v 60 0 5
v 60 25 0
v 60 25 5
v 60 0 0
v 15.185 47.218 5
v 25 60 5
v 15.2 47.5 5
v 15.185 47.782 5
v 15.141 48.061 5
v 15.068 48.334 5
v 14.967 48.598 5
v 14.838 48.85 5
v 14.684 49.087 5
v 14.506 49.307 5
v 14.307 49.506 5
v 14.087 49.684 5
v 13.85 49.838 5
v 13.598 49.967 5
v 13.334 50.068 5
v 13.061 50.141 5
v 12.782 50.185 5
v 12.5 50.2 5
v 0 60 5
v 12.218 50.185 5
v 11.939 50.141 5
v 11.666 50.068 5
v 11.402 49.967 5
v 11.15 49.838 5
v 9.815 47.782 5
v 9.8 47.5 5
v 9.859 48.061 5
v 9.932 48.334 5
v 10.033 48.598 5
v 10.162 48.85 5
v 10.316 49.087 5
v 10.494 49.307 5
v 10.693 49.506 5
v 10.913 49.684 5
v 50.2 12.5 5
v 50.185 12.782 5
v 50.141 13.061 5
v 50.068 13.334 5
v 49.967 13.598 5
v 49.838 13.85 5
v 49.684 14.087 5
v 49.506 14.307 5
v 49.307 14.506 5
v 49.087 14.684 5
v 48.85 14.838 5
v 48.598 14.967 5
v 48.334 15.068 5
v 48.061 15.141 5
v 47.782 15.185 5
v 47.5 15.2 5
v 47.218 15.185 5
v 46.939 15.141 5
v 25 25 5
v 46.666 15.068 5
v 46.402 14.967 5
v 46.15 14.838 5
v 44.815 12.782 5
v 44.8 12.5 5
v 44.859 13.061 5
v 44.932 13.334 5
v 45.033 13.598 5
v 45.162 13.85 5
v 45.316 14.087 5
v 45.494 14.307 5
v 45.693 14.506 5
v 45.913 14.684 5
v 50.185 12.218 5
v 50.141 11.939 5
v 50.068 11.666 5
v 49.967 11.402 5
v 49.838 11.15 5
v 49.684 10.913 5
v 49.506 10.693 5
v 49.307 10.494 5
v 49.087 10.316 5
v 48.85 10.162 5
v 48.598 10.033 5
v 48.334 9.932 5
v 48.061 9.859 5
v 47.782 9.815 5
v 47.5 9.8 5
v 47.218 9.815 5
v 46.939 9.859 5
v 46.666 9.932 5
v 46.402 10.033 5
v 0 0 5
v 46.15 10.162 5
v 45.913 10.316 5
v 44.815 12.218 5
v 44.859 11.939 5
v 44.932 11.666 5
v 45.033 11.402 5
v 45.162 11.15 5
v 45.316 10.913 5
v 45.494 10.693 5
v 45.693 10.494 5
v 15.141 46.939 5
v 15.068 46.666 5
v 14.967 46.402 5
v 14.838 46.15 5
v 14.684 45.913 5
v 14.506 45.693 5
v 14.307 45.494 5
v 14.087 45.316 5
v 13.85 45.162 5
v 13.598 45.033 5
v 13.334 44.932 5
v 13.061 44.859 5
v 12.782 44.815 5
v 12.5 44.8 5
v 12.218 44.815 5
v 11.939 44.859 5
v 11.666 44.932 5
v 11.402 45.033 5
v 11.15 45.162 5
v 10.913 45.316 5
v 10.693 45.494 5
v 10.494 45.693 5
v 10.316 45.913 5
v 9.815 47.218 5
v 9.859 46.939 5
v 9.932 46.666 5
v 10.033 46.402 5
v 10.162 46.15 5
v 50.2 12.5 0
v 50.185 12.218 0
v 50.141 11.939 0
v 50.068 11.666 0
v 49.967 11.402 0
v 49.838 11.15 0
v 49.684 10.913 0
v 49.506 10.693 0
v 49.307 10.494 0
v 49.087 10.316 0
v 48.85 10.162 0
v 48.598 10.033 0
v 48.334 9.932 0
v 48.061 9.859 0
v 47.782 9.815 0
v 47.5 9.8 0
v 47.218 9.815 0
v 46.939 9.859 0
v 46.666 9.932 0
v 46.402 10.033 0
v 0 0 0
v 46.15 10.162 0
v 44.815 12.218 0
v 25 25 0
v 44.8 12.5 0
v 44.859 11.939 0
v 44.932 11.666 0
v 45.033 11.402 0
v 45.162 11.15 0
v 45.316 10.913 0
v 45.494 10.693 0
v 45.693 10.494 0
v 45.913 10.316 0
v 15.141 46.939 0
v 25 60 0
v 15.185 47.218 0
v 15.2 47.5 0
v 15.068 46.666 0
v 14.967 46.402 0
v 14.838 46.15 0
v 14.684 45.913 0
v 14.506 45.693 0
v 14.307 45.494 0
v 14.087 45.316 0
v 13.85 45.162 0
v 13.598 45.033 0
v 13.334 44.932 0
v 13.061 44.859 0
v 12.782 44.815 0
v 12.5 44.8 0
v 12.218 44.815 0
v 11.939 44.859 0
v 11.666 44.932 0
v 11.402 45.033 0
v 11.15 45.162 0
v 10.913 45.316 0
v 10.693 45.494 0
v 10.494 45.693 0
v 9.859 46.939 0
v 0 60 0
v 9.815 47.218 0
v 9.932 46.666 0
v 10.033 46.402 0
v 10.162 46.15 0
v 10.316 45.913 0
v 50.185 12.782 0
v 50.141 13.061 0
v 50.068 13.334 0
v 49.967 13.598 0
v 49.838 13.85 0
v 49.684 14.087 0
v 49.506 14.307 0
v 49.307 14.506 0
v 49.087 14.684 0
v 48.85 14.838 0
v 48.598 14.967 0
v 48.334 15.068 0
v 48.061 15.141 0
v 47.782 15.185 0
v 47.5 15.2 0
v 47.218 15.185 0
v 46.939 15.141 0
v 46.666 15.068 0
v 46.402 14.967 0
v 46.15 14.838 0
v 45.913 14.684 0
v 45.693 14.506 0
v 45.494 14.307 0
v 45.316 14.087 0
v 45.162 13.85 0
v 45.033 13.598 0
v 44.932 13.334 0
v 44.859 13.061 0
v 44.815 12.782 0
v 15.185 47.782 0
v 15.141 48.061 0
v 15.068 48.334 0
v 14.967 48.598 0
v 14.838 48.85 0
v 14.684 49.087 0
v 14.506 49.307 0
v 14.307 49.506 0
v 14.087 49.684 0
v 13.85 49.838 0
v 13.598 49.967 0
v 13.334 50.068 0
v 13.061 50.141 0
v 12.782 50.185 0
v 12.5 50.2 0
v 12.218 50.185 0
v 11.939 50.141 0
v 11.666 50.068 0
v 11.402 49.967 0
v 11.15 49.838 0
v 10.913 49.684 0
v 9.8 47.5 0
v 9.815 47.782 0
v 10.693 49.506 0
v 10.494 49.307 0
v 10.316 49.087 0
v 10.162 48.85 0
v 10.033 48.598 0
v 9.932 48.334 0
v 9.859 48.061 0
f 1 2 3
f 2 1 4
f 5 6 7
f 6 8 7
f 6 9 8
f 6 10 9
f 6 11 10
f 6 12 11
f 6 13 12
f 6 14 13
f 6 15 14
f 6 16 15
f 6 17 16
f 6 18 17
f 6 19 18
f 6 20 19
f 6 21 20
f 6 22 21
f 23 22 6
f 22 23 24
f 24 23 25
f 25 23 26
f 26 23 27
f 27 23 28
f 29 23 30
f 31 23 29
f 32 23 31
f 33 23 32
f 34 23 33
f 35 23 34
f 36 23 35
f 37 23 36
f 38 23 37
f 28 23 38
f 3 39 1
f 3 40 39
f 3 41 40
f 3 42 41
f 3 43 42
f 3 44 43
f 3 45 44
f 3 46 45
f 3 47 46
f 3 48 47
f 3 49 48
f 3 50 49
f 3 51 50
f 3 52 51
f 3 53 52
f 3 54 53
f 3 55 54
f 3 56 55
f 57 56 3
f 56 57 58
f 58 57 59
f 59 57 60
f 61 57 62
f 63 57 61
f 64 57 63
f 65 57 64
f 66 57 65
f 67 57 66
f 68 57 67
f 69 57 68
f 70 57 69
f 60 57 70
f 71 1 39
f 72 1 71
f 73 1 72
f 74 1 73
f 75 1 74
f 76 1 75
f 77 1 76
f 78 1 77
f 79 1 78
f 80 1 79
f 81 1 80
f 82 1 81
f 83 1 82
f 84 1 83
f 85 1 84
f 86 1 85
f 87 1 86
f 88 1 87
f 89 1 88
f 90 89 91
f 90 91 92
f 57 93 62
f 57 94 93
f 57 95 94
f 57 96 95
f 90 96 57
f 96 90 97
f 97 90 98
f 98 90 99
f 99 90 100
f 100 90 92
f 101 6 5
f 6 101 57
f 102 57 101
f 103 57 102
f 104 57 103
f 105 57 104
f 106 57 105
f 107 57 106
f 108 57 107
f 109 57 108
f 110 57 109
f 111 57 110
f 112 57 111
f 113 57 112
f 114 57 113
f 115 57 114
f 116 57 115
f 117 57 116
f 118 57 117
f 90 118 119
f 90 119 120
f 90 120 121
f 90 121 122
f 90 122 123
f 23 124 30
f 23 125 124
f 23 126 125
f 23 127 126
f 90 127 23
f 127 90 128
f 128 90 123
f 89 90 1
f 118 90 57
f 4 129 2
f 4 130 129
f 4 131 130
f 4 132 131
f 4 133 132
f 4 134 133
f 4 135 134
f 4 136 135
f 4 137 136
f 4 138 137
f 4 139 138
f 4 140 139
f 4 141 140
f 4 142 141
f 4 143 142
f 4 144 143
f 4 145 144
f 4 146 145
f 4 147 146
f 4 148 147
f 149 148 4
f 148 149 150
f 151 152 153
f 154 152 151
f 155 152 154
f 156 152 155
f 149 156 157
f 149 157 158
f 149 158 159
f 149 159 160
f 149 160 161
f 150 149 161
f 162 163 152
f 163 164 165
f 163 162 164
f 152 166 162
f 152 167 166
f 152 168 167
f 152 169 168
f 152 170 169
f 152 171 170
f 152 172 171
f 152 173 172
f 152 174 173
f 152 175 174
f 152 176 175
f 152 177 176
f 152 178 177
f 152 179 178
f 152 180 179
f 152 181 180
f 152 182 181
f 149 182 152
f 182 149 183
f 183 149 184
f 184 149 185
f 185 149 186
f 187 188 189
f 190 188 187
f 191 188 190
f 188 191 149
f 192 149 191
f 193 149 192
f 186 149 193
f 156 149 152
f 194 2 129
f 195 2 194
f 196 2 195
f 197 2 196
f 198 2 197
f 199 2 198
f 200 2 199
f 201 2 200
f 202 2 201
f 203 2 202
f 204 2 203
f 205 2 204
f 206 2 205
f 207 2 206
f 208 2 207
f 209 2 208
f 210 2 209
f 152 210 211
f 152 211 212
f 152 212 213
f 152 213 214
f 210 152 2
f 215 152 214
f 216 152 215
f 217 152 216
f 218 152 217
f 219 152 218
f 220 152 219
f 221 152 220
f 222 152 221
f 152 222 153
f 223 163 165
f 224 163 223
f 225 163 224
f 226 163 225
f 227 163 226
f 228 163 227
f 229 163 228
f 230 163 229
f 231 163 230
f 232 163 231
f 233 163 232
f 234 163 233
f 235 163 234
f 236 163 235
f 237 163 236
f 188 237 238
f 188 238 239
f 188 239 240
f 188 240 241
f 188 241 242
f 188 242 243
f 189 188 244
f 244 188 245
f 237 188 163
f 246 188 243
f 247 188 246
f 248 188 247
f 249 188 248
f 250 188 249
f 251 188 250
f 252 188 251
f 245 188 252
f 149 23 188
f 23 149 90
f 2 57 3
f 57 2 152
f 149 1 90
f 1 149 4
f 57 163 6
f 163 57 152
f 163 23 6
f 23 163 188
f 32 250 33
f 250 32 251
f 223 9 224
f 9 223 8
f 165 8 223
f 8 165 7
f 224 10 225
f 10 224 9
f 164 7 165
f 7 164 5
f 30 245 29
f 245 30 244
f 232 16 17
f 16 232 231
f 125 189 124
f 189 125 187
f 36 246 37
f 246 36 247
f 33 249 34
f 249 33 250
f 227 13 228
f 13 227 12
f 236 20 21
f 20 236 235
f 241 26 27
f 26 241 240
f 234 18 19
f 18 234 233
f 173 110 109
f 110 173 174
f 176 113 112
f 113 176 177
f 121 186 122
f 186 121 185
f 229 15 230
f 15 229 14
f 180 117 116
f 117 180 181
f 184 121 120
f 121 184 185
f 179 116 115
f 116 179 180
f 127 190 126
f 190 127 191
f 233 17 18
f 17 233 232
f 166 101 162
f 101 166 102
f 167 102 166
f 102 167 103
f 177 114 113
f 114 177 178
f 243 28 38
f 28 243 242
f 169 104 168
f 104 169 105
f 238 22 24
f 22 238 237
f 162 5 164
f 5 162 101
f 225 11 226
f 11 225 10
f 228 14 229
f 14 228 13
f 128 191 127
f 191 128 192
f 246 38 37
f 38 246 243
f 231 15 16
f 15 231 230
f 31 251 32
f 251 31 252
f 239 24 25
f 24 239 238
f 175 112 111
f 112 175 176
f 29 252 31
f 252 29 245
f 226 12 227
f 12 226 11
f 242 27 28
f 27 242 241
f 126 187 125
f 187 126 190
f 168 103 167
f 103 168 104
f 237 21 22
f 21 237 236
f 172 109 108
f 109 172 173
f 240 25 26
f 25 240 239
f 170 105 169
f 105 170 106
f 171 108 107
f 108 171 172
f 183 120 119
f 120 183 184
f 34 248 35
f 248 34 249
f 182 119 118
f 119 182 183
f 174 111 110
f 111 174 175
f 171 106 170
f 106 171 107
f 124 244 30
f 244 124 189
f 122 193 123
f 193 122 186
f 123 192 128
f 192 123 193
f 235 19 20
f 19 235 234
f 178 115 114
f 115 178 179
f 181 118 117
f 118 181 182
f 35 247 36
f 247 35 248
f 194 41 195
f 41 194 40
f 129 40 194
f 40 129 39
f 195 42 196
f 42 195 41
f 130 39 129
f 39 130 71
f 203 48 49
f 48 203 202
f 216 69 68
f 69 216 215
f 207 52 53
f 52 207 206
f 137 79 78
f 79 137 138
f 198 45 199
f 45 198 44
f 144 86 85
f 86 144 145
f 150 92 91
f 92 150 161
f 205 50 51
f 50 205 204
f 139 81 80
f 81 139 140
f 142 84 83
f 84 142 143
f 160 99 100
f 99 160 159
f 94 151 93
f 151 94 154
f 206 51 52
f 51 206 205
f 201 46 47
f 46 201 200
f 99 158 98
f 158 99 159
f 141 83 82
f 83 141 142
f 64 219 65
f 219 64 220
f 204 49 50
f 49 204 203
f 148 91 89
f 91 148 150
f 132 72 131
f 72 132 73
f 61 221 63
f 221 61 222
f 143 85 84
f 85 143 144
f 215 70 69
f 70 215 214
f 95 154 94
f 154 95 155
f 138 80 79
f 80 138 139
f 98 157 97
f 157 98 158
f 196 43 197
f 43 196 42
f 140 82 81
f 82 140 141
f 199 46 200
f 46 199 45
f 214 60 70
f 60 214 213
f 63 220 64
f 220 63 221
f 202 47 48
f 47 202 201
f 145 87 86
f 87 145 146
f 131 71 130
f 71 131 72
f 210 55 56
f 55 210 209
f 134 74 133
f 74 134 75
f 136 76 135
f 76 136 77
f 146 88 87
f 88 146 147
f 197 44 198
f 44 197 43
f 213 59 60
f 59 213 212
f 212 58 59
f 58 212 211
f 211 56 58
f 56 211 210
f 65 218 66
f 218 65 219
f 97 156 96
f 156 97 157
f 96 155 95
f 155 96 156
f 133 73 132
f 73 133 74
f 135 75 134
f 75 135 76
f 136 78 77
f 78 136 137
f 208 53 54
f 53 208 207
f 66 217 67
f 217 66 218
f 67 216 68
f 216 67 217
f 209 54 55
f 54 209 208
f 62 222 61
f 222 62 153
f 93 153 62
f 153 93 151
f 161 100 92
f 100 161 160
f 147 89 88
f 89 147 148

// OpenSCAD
// Flat 90-degree corner plate.
$fn = 60;
eps = 0.02;
arm = 60;
width = 25;
plate_t = 5;
difference() {
    union() { cube([arm, width, plate_t]); cube([width, arm, plate_t]); }
    for (p = [[width / 2, arm - width / 2], [arm - width / 2, width / 2]])
        translate([p[0], p[1], -eps]) cylinder(d = 5.4, h = plate_t + 2 * eps);
}
